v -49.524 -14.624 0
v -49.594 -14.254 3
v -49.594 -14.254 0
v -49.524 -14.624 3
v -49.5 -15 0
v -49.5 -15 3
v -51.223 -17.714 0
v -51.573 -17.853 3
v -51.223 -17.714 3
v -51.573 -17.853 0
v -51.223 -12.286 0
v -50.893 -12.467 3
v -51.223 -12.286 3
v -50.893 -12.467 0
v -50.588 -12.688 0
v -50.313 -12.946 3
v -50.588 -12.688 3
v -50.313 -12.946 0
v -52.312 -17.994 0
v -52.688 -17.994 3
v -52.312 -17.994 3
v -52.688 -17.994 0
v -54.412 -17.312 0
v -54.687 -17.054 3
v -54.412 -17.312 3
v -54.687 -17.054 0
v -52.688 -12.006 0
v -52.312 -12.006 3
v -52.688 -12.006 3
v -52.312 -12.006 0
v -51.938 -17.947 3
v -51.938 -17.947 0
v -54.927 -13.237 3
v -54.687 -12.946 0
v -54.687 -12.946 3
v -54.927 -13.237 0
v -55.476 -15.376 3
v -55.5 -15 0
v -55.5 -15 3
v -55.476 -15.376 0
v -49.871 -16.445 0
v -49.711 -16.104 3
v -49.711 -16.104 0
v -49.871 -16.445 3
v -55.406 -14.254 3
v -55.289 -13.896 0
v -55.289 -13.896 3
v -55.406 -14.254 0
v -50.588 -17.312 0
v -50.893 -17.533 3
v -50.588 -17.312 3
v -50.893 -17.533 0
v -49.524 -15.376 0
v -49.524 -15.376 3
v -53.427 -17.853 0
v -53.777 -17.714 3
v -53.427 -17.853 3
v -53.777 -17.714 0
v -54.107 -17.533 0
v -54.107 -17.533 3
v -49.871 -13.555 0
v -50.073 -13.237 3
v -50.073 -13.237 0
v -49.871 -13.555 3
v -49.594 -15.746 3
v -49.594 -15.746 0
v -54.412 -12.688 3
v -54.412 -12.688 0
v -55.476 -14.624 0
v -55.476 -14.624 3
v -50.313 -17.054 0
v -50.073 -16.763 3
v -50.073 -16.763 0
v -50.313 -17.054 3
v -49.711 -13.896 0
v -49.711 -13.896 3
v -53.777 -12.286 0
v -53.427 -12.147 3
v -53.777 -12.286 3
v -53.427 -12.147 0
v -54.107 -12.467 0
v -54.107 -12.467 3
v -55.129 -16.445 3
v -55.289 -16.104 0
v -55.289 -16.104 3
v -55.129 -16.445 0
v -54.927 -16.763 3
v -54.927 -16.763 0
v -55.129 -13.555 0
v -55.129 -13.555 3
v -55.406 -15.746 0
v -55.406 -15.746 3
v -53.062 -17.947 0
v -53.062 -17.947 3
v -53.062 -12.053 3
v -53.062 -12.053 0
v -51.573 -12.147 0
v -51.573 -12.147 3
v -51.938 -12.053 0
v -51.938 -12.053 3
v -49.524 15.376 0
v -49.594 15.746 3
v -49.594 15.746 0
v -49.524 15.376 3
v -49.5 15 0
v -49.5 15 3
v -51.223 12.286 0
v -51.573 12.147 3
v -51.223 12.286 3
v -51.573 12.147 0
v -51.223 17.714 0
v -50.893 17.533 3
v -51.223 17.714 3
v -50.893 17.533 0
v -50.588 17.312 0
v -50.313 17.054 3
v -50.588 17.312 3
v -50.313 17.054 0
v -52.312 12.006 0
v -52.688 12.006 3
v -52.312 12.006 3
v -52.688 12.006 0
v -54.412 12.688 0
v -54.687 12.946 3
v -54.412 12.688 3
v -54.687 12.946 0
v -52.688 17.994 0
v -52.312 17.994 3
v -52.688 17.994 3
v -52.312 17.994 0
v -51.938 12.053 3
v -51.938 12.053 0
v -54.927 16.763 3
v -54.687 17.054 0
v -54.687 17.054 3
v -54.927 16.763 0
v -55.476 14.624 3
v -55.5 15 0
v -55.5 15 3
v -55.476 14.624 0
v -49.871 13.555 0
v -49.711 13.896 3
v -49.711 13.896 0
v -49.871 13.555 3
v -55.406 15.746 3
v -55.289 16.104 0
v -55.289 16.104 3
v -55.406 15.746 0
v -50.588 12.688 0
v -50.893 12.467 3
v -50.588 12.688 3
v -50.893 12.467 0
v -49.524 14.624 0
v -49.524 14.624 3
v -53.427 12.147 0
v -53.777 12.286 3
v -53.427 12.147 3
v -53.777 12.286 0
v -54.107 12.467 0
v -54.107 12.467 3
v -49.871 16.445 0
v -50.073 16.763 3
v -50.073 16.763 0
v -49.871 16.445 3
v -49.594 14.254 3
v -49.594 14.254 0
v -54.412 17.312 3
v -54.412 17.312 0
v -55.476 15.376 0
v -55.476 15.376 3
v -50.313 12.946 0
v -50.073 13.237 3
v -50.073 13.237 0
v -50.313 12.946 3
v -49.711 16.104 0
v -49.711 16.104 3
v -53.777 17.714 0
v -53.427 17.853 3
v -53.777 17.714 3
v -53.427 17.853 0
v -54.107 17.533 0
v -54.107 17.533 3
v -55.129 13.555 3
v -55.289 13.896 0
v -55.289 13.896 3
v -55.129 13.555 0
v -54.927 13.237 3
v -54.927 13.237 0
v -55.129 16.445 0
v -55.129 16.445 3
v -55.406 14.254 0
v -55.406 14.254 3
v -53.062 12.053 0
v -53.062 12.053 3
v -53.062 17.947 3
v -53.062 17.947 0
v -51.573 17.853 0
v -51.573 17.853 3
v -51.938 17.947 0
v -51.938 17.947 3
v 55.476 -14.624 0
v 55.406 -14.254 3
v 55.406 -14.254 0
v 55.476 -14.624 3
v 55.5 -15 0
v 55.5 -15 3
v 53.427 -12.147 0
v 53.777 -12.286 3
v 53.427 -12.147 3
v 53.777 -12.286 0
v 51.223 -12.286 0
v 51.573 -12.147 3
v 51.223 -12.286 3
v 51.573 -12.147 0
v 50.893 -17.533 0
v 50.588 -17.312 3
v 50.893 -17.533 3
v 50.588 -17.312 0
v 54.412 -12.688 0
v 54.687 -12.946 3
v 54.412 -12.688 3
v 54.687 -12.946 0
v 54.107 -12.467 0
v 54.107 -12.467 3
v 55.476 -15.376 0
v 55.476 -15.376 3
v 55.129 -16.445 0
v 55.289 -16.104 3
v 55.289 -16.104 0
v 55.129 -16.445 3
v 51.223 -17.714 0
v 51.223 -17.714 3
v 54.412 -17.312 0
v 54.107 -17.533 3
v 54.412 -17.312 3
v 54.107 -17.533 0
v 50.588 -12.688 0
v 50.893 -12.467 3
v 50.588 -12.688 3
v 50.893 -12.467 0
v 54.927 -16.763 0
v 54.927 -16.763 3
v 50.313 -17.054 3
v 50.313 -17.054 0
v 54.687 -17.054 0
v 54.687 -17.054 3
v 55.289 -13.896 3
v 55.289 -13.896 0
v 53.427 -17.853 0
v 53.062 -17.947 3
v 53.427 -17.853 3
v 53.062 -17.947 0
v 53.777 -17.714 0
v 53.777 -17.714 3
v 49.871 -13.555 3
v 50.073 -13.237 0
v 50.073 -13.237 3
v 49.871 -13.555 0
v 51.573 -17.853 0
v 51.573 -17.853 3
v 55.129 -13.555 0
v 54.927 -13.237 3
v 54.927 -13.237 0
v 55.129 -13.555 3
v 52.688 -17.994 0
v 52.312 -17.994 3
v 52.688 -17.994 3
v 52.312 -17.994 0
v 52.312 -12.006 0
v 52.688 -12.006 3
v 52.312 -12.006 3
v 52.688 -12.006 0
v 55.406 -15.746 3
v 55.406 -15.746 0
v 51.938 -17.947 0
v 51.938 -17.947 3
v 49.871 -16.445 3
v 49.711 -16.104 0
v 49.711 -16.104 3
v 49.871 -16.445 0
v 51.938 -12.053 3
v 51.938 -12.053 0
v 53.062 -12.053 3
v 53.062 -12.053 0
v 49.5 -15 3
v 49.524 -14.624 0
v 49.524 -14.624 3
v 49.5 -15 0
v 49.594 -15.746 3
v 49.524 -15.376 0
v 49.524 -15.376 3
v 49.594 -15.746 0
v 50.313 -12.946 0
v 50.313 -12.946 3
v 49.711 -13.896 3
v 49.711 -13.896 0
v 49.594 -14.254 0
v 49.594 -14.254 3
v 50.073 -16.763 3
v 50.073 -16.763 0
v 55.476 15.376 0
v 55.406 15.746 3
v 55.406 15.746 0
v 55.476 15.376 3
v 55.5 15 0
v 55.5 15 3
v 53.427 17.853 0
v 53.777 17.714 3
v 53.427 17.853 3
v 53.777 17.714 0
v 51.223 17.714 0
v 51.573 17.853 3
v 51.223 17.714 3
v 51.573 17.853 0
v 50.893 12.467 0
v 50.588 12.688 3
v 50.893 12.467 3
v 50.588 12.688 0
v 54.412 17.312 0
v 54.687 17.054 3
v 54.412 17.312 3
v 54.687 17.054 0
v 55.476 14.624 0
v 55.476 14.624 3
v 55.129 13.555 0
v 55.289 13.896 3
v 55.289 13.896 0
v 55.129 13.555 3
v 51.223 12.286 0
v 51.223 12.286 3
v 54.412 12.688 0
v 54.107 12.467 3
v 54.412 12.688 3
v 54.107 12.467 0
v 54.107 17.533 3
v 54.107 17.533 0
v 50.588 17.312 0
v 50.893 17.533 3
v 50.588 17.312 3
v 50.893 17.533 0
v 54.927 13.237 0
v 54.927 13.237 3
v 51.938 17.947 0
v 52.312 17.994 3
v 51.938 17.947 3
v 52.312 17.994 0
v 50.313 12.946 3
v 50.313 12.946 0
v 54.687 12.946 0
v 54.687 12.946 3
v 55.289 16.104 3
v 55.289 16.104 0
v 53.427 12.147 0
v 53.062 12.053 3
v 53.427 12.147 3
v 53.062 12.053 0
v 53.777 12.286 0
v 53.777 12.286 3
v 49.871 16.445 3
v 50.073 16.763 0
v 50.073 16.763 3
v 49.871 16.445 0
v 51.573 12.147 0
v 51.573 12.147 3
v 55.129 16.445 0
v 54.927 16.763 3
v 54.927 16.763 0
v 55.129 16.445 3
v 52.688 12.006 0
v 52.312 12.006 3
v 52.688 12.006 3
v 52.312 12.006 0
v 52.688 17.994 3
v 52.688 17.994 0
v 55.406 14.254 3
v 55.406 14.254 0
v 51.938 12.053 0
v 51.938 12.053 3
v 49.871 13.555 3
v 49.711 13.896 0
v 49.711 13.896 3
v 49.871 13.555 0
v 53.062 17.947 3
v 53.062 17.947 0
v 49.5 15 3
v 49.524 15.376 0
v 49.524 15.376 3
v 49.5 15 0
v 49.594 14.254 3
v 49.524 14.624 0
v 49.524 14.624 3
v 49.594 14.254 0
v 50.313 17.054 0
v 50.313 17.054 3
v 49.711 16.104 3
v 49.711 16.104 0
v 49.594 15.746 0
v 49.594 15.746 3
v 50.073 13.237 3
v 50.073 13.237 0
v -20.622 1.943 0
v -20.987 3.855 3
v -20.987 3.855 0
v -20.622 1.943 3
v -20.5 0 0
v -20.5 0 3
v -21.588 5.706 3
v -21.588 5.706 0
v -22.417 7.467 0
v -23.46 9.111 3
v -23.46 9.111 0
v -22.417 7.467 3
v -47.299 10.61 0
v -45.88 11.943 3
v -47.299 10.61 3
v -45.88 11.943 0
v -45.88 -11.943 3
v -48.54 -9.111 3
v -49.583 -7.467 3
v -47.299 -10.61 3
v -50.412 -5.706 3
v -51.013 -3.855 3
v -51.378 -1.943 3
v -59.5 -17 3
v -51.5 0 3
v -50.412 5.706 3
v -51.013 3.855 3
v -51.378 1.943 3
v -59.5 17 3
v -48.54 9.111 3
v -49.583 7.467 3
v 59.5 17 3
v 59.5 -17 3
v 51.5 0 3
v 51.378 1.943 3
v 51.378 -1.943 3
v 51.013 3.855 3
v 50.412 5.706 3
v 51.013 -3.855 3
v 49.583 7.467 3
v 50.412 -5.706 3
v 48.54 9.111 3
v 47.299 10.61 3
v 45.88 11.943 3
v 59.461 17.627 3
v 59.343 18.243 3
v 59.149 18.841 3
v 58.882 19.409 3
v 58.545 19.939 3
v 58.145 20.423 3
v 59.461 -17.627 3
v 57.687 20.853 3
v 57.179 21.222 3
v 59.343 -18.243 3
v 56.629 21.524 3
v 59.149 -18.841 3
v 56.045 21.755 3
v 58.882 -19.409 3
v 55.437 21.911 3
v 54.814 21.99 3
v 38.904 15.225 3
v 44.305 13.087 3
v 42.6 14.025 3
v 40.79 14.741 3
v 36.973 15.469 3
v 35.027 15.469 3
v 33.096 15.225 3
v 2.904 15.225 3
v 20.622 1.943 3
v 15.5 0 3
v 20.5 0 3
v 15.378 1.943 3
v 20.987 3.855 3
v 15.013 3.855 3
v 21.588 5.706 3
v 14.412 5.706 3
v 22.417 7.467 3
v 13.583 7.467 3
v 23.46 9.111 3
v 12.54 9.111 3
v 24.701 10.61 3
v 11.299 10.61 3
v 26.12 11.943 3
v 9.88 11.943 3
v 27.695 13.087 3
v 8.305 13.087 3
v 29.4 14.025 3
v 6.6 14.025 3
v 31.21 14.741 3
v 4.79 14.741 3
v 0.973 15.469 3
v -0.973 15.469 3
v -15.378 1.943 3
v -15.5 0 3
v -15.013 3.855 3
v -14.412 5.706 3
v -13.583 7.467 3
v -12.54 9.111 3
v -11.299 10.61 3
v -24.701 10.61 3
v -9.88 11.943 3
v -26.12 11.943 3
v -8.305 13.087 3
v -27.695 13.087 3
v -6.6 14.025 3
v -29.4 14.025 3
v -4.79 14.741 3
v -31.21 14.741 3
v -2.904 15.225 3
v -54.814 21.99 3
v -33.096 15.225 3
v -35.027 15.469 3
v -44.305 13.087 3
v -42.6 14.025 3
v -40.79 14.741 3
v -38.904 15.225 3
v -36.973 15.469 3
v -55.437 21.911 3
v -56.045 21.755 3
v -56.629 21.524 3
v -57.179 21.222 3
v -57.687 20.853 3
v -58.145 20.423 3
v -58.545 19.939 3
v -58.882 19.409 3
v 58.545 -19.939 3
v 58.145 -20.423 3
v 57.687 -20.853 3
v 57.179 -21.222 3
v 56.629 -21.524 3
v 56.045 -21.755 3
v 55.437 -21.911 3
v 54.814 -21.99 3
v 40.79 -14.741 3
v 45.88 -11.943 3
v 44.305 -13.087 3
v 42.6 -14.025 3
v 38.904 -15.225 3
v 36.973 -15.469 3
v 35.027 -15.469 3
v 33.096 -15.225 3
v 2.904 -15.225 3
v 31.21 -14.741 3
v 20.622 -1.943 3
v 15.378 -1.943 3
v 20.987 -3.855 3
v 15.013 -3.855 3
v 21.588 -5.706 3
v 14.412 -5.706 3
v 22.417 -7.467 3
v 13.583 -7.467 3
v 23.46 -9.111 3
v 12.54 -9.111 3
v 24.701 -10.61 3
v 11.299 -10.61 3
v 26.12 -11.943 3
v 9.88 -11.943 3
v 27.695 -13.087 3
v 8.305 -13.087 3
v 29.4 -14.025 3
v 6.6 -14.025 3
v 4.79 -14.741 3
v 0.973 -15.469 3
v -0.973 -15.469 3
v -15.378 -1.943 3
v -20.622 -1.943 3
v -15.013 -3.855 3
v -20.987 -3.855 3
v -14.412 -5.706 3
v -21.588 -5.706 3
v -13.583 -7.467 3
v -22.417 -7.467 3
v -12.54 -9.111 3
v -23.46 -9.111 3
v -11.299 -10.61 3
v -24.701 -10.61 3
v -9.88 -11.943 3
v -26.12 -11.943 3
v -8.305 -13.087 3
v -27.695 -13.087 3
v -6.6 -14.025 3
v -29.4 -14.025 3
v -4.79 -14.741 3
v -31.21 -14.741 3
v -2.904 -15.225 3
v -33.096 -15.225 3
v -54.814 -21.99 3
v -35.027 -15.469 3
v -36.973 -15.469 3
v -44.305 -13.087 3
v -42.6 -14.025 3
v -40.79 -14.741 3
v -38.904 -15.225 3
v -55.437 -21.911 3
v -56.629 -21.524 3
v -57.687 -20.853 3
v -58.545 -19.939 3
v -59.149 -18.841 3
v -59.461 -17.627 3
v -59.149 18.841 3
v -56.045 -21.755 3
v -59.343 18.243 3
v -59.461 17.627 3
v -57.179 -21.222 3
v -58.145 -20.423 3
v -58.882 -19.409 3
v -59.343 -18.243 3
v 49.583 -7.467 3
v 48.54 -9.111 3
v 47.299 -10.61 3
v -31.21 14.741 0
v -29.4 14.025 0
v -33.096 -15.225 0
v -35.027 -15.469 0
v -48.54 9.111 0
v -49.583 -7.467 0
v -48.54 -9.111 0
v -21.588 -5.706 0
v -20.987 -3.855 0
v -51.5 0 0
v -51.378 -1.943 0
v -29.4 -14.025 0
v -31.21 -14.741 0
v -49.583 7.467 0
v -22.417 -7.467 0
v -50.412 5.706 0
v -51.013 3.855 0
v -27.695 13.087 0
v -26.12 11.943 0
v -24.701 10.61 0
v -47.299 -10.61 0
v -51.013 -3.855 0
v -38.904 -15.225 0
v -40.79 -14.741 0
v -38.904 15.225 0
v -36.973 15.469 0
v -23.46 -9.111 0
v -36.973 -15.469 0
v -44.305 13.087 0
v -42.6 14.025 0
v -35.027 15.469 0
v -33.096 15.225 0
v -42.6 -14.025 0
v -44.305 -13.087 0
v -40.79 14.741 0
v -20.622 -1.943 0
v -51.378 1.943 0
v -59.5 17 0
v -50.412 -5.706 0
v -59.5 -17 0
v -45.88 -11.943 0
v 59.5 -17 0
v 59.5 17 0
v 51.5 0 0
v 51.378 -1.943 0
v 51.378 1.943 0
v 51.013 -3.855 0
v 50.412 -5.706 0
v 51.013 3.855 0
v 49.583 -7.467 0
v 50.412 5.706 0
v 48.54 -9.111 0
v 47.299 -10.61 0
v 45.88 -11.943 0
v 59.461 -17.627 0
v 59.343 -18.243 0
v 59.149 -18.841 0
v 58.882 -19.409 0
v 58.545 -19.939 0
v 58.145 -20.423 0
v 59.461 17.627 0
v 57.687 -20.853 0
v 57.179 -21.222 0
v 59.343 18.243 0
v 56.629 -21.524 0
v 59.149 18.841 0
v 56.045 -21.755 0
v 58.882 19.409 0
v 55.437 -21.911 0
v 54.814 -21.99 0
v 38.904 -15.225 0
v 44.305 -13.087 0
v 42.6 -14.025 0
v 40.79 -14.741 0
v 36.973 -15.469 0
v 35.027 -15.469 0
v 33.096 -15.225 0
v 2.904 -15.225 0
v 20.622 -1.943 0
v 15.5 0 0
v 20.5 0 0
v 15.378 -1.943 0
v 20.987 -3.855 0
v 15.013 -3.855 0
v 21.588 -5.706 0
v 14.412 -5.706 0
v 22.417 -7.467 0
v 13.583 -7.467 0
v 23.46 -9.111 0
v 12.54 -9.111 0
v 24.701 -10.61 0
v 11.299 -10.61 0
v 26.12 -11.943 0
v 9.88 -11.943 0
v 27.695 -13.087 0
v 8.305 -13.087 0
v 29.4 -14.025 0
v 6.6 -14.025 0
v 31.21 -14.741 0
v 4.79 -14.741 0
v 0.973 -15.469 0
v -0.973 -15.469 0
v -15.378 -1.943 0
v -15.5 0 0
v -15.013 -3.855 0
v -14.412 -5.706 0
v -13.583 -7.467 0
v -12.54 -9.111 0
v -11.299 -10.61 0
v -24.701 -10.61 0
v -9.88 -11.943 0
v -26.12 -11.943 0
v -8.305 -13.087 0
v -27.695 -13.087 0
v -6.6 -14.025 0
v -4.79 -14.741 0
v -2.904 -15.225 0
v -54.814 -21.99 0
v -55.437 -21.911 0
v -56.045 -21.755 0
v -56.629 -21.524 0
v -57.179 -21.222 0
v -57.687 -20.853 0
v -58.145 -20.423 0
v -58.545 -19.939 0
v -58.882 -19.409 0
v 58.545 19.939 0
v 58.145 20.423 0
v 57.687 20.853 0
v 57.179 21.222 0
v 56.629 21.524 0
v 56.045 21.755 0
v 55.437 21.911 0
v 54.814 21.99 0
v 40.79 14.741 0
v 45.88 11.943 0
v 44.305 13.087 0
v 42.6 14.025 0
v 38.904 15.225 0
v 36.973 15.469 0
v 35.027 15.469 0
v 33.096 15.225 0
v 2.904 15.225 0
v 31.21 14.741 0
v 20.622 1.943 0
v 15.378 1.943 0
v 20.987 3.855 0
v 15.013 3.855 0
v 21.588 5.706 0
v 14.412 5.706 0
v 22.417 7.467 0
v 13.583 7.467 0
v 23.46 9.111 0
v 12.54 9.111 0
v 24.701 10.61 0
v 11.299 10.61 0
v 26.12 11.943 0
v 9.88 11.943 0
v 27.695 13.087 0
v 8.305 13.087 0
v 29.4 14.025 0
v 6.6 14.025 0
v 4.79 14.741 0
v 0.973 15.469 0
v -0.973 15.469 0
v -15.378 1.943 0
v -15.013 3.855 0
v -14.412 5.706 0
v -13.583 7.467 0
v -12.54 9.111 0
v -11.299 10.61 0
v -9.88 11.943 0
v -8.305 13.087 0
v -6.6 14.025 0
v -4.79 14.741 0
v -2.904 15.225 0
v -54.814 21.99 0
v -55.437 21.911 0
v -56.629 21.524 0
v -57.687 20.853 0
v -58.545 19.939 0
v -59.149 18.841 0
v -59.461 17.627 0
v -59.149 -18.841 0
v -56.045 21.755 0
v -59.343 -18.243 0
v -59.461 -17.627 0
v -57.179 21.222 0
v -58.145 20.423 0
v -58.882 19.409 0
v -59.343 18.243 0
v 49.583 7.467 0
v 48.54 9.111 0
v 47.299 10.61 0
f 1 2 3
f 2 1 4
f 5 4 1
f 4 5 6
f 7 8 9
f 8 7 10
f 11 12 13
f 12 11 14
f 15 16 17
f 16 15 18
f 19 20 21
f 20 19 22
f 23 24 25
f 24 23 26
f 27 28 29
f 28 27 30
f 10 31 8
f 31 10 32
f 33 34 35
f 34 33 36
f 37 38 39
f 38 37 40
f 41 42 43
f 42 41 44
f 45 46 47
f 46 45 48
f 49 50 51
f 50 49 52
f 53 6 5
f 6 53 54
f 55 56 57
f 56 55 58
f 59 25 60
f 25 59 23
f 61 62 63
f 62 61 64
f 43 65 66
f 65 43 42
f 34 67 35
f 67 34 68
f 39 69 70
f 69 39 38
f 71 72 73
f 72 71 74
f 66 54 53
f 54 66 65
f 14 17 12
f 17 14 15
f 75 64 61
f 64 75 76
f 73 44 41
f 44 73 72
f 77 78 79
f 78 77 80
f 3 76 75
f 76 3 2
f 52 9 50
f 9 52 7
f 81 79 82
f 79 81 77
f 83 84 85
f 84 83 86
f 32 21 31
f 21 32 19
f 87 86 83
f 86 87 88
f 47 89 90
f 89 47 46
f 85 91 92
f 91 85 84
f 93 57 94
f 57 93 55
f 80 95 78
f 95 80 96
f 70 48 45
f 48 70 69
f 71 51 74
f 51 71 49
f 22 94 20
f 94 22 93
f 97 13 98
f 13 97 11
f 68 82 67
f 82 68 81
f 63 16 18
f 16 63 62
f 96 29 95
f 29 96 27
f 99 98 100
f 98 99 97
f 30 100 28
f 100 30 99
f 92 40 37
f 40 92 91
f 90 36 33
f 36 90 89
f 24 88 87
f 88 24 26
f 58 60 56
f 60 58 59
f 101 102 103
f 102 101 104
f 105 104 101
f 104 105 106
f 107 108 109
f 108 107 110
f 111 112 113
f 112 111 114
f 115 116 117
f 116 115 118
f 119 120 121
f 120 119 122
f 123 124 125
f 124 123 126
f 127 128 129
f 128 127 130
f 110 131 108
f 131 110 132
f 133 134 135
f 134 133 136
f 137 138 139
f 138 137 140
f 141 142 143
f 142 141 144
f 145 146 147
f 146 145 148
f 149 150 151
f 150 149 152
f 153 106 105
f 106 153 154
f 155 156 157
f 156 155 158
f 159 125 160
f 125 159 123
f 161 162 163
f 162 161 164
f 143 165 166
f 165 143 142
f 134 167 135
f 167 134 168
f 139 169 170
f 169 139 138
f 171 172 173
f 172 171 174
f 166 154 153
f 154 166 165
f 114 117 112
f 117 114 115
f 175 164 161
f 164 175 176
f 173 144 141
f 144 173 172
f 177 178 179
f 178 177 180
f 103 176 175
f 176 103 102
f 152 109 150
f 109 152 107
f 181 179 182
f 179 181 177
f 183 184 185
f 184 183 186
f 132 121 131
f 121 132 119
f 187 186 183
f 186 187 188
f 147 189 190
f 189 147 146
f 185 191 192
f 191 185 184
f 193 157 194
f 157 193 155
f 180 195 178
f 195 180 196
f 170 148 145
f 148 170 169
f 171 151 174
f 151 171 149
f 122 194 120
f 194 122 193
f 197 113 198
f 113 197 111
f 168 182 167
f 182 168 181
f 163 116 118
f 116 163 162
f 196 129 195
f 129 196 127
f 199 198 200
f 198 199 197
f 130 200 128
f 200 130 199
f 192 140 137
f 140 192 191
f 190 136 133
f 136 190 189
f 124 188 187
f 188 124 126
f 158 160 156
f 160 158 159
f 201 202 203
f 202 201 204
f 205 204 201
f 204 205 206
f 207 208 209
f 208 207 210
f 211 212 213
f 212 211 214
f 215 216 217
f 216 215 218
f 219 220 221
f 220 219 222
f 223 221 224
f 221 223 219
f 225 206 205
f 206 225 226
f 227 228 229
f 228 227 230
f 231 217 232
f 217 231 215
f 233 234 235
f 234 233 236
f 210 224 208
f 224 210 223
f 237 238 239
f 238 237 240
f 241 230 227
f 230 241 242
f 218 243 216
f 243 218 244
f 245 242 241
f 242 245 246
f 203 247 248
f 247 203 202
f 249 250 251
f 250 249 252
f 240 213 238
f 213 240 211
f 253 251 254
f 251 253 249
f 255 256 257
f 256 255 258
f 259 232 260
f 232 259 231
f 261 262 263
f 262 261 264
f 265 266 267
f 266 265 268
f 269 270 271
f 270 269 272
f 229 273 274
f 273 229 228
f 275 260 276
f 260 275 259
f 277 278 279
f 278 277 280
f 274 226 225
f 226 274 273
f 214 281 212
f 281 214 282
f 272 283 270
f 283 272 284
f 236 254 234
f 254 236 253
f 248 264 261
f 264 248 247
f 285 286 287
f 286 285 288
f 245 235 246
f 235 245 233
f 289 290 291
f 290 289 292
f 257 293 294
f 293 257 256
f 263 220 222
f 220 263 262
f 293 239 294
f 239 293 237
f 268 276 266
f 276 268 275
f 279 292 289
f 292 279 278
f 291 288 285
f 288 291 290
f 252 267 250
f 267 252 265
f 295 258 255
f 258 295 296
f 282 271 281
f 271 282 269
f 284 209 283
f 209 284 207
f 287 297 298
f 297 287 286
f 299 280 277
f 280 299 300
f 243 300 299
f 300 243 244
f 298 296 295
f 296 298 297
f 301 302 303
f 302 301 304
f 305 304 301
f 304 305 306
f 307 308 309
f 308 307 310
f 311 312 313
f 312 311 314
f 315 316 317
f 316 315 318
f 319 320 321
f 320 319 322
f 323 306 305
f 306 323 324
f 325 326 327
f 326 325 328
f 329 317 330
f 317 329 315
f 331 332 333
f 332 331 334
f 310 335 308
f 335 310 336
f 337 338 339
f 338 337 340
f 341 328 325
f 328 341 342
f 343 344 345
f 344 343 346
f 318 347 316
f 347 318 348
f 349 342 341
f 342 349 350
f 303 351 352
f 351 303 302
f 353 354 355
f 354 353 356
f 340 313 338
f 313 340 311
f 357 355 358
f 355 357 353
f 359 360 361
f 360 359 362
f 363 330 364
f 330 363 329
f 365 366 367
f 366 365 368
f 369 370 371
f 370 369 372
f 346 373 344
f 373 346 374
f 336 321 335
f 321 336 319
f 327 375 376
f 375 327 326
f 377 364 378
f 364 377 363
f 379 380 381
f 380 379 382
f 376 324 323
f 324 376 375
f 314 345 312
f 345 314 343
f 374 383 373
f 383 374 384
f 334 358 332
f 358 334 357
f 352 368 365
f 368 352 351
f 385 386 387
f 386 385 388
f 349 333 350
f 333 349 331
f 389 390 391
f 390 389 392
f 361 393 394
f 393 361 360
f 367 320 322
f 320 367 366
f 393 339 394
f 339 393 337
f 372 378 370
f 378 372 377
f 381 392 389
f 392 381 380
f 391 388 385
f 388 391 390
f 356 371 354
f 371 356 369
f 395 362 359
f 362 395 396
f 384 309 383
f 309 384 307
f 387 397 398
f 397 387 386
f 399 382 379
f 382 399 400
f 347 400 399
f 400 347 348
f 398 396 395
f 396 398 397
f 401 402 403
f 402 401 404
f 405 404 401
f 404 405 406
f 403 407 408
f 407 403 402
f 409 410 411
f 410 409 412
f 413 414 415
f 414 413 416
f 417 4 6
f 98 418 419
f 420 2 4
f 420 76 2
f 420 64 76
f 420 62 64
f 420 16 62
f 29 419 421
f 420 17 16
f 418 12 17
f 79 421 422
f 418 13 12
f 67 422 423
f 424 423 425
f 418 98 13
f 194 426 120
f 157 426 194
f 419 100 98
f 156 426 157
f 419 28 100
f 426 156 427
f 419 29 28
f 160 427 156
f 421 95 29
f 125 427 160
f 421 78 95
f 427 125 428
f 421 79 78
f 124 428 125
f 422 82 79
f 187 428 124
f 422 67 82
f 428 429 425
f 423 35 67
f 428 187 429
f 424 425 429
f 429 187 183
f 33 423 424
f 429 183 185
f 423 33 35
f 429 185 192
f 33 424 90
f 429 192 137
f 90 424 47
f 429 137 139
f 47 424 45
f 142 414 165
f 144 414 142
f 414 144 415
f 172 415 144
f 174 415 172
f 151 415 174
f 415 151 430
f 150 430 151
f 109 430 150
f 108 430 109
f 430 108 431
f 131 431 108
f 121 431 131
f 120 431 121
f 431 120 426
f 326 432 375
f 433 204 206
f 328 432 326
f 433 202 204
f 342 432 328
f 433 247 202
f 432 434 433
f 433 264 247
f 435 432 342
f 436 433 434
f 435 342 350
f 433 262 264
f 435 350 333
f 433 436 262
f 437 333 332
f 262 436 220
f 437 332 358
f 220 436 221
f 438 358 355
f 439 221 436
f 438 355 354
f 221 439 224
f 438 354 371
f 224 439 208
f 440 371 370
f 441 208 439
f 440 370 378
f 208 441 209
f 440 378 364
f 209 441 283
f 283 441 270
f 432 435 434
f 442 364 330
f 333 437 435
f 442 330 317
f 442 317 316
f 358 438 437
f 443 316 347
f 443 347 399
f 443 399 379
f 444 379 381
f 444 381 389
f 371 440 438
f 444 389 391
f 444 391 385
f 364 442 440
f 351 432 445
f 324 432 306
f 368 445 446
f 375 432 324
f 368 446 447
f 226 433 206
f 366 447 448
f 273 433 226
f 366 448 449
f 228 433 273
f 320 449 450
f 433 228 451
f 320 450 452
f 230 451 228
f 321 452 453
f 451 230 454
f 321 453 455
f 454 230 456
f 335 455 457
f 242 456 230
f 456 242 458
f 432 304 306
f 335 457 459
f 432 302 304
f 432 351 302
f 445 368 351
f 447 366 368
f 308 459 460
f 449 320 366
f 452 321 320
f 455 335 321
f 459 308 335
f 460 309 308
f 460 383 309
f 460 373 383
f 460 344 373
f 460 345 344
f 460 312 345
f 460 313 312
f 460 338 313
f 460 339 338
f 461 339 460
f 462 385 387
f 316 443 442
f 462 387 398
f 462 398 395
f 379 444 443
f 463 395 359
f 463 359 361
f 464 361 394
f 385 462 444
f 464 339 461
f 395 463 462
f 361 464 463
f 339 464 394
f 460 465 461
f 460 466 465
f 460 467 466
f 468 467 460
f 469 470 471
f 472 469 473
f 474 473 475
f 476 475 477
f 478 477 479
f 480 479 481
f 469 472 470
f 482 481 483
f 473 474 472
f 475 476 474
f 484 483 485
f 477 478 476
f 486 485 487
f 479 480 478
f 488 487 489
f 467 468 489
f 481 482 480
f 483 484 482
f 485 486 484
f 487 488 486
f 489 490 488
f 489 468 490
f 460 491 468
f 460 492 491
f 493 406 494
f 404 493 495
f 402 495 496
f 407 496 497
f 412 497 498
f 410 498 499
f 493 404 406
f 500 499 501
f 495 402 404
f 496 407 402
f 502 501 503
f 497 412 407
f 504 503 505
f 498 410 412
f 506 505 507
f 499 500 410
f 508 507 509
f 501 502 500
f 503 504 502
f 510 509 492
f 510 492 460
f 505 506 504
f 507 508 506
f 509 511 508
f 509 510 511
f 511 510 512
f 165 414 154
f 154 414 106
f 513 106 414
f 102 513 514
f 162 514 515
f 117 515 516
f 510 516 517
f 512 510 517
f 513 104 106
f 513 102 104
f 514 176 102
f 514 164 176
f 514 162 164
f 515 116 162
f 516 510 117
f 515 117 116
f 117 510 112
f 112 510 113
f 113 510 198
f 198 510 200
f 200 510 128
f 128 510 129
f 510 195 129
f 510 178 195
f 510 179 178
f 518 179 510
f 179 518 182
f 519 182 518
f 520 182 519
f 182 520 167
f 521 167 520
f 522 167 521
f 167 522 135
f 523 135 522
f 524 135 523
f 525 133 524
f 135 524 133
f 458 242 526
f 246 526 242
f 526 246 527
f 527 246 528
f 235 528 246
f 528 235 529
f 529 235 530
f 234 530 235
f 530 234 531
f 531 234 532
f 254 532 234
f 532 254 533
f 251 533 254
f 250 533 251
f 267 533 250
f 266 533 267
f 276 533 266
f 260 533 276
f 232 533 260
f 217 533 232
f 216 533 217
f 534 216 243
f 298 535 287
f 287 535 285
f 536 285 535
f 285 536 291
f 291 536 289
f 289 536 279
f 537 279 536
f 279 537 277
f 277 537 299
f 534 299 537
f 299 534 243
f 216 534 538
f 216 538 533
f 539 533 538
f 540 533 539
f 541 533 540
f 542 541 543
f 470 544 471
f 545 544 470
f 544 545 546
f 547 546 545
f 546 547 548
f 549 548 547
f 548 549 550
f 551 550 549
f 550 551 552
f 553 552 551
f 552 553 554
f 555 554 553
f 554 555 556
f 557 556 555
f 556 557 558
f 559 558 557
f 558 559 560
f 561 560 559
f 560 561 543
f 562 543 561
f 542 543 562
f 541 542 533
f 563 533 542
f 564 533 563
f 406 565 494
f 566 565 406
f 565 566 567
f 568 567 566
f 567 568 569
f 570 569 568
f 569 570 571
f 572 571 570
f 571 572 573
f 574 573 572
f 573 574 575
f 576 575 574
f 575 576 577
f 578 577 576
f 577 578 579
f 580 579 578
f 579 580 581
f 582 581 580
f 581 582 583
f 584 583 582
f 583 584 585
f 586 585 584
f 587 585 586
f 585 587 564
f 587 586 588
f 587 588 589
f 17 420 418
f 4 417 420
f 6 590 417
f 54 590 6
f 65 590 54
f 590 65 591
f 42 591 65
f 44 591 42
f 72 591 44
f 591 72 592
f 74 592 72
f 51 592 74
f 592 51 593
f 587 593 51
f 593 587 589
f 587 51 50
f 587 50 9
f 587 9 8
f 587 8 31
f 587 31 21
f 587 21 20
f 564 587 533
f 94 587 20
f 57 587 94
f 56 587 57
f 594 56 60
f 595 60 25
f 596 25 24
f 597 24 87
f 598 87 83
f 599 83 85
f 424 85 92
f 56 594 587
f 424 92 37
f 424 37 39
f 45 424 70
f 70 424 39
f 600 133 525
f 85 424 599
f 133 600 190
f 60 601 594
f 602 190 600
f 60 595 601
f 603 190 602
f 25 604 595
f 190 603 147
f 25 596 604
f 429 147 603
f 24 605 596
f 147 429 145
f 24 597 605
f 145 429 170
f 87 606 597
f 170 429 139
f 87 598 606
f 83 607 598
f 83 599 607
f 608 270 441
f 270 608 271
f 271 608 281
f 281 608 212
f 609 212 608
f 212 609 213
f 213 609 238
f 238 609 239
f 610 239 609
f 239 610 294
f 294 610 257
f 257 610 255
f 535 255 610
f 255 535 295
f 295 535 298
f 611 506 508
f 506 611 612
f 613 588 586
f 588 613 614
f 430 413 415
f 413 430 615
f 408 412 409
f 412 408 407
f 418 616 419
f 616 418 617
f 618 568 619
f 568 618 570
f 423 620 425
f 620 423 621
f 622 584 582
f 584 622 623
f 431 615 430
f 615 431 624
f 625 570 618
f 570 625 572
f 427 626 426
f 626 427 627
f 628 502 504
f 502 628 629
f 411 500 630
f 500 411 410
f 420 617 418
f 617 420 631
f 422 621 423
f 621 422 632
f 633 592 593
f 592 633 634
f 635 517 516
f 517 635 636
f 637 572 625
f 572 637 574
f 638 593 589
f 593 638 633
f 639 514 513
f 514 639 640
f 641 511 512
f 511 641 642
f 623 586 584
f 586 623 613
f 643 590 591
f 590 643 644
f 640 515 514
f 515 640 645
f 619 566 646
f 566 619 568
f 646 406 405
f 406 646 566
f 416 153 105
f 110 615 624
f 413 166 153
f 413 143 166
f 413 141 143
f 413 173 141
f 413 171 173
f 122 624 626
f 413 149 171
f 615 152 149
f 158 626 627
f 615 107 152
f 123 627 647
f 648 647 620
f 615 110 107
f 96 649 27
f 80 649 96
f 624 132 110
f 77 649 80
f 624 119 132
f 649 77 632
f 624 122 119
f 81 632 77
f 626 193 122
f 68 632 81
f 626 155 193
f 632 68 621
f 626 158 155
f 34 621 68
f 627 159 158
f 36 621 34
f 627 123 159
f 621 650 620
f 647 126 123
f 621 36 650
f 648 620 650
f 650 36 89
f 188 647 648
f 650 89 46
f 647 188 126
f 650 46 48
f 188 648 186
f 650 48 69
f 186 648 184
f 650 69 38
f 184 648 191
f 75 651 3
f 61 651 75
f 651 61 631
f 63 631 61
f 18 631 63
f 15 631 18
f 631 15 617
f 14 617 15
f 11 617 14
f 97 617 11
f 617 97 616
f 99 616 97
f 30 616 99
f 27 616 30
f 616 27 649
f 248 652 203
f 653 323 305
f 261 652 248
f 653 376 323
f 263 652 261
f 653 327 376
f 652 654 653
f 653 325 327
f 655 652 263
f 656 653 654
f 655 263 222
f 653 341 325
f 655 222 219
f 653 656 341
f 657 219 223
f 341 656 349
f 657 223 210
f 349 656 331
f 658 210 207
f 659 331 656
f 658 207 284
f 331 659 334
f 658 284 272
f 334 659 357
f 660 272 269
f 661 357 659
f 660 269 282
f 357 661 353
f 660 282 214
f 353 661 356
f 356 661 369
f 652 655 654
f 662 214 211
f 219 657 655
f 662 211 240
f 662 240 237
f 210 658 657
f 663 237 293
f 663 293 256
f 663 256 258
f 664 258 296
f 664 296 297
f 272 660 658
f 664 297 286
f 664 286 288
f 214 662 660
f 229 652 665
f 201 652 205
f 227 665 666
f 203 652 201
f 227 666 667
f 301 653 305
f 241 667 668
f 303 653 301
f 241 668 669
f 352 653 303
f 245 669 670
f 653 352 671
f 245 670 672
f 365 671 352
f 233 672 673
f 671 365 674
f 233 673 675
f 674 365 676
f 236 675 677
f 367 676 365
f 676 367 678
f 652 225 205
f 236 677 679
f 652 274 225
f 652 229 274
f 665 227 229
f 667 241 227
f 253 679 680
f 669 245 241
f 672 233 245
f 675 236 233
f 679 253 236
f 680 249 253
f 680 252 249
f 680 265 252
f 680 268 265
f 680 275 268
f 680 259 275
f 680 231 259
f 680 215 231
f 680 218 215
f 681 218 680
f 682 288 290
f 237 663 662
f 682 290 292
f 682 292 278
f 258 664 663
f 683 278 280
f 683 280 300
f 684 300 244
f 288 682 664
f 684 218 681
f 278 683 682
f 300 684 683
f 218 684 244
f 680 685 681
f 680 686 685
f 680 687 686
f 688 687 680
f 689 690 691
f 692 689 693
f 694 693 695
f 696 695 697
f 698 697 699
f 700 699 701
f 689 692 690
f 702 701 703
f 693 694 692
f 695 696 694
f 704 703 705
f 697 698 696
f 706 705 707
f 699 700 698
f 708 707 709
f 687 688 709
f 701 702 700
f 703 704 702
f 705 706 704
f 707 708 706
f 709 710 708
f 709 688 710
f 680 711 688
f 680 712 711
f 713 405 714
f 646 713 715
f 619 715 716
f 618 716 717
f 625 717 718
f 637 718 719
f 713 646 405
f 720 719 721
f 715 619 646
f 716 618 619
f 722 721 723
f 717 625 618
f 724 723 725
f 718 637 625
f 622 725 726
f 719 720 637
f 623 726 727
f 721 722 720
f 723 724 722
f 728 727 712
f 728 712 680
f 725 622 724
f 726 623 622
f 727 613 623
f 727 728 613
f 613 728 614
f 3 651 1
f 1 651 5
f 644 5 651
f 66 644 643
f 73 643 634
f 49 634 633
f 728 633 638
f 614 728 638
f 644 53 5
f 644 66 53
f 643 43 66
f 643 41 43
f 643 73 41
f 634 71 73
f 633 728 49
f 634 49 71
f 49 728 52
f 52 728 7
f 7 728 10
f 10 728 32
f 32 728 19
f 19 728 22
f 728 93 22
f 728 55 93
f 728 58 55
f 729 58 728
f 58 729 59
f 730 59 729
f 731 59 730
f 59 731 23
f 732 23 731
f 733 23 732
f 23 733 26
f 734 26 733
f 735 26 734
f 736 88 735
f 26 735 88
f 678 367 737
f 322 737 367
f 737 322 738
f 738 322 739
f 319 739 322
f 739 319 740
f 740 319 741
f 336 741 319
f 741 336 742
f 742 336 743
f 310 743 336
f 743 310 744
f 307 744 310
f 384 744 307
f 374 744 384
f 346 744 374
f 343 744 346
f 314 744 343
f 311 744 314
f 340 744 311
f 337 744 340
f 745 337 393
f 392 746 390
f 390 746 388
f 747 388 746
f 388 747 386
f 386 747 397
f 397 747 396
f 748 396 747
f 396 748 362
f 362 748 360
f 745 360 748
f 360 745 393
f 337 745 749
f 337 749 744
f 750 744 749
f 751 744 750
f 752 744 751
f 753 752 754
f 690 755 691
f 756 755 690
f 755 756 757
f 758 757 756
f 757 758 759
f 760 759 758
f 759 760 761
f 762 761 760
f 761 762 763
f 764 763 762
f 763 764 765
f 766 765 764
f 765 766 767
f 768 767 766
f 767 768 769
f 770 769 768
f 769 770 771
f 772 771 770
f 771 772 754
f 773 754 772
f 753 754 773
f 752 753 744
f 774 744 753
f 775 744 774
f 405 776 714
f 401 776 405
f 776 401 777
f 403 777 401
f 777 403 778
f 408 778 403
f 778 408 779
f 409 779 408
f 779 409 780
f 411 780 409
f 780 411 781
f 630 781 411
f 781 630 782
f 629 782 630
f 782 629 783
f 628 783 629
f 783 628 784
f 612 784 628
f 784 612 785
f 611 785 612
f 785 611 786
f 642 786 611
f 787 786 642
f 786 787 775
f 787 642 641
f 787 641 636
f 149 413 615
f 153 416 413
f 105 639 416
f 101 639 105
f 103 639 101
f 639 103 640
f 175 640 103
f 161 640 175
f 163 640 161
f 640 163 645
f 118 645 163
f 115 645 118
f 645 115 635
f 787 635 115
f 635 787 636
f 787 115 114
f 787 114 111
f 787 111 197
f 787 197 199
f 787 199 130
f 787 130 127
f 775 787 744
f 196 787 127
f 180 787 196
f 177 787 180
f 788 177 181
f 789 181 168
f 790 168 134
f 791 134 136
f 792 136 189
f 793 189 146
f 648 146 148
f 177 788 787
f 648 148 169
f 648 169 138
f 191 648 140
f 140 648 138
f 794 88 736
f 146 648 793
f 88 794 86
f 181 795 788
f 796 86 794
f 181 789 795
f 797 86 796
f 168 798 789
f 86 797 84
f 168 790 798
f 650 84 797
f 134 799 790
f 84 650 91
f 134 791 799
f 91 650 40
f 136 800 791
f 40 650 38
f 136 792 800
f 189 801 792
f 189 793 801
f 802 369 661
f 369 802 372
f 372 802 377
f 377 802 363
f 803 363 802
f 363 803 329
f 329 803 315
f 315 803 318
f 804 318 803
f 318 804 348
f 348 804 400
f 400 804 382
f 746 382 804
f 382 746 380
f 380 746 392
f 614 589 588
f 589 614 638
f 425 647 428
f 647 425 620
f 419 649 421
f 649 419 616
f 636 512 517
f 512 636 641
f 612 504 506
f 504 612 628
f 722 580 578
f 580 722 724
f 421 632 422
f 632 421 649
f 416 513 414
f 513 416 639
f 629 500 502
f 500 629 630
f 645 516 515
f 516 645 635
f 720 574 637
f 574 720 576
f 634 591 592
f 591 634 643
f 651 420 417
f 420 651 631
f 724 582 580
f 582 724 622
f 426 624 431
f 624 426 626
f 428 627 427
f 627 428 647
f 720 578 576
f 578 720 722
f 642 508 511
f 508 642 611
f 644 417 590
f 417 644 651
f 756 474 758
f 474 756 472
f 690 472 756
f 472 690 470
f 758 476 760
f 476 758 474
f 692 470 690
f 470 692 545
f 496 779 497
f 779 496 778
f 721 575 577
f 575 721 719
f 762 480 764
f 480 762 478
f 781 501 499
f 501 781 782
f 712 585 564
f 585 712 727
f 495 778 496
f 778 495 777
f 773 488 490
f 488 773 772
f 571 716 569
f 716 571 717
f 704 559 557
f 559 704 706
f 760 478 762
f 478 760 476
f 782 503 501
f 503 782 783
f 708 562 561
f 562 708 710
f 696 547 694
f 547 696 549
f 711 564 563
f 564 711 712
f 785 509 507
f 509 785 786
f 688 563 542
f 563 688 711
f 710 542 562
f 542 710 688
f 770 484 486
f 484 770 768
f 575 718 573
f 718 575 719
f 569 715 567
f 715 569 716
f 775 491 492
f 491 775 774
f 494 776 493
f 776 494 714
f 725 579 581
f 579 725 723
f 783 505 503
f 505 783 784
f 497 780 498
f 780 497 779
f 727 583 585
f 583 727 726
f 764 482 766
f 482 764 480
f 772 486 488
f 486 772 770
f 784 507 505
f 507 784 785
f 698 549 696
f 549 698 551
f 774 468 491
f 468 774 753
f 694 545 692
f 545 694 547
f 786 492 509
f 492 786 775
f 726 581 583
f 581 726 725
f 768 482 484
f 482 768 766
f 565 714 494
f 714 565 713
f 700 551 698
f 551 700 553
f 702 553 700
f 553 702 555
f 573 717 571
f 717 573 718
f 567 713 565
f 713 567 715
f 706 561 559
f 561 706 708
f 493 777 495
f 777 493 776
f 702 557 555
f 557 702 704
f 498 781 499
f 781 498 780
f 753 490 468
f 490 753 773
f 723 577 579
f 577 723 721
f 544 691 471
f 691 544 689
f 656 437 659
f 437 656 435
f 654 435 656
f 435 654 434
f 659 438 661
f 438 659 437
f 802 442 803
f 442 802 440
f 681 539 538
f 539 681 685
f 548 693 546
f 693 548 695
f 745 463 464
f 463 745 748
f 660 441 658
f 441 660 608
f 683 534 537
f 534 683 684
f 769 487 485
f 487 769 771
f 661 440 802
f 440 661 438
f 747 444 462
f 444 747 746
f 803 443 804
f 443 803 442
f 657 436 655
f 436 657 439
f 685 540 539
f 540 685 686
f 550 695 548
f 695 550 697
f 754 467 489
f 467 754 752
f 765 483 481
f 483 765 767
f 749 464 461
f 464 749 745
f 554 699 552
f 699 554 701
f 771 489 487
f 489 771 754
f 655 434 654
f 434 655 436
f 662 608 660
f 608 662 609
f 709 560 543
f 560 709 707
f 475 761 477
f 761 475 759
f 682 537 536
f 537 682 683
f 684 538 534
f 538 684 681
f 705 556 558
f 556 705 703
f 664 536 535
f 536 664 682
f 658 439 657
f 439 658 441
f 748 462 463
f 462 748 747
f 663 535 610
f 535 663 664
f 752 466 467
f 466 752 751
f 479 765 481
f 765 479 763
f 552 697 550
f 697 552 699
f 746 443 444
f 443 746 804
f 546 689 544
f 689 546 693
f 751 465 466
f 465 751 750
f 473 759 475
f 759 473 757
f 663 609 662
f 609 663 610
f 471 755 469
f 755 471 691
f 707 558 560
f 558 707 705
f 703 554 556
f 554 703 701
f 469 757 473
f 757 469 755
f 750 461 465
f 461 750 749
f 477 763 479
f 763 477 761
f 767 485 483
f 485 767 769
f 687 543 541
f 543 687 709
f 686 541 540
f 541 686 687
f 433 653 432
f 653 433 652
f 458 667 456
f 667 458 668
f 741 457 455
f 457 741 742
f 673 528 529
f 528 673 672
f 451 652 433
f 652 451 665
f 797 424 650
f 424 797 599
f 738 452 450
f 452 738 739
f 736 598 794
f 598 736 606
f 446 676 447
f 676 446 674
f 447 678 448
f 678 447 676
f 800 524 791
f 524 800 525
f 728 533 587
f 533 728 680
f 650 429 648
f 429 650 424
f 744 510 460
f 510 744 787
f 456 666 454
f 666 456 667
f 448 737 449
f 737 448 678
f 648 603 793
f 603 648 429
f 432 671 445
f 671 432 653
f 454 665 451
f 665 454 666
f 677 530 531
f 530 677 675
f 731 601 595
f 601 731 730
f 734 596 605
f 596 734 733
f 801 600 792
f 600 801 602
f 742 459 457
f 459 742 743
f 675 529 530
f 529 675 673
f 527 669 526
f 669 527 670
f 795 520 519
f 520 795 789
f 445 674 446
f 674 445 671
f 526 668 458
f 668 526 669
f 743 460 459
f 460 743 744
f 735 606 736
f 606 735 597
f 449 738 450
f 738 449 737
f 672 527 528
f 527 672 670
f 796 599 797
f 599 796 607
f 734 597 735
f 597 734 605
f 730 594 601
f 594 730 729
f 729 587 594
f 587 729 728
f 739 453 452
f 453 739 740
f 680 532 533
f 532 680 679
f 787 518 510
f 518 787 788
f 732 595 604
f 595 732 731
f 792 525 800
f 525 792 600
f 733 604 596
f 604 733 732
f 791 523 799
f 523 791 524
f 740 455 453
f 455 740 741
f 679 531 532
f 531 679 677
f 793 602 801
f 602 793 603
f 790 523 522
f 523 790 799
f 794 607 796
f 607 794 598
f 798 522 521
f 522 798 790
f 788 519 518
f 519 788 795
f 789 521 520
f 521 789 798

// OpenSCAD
$fn = 50;


difference() {
	union() {
		hull() {
			translate(v = [-54.5000000000, 17.0000000000, 0]) {
				cylinder(h = 3, r = 5);
			}
			translate(v = [54.5000000000, 17.0000000000, 0]) {
				cylinder(h = 3, r = 5);
			}
			translate(v = [-54.5000000000, -17.0000000000, 0]) {
				cylinder(h = 3, r = 5);
			}
			translate(v = [54.5000000000, -17.0000000000, 0]) {
				cylinder(h = 3, r = 5);
			}
		}
	}
	union() {
		#translate(v = [-52.5000000000, -15.0000000000, -100.0000000000]) {
			cylinder(h = 200, r = 3.0000000000);
		}
		#translate(v = [-52.5000000000, 15.0000000000, -100.0000000000]) {
			cylinder(h = 200, r = 3.0000000000);
		}
		#translate(v = [52.5000000000, -15.0000000000, -100.0000000000]) {
			cylinder(h = 200, r = 3.0000000000);
		}
		#translate(v = [52.5000000000, 15.0000000000, -100.0000000000]) {
			cylinder(h = 200, r = 3.0000000000);
		}
		#translate(v = [-36.0000000000, 0, 0]) {
			cylinder(h = 3, r = 15.5000000000);
		}
		#cylinder(h = 3, r = 15.5000000000);
		#translate(v = [36.0000000000, 0, 0]) {
			cylinder(h = 3, r = 15.5000000000);
		}
	}
}
